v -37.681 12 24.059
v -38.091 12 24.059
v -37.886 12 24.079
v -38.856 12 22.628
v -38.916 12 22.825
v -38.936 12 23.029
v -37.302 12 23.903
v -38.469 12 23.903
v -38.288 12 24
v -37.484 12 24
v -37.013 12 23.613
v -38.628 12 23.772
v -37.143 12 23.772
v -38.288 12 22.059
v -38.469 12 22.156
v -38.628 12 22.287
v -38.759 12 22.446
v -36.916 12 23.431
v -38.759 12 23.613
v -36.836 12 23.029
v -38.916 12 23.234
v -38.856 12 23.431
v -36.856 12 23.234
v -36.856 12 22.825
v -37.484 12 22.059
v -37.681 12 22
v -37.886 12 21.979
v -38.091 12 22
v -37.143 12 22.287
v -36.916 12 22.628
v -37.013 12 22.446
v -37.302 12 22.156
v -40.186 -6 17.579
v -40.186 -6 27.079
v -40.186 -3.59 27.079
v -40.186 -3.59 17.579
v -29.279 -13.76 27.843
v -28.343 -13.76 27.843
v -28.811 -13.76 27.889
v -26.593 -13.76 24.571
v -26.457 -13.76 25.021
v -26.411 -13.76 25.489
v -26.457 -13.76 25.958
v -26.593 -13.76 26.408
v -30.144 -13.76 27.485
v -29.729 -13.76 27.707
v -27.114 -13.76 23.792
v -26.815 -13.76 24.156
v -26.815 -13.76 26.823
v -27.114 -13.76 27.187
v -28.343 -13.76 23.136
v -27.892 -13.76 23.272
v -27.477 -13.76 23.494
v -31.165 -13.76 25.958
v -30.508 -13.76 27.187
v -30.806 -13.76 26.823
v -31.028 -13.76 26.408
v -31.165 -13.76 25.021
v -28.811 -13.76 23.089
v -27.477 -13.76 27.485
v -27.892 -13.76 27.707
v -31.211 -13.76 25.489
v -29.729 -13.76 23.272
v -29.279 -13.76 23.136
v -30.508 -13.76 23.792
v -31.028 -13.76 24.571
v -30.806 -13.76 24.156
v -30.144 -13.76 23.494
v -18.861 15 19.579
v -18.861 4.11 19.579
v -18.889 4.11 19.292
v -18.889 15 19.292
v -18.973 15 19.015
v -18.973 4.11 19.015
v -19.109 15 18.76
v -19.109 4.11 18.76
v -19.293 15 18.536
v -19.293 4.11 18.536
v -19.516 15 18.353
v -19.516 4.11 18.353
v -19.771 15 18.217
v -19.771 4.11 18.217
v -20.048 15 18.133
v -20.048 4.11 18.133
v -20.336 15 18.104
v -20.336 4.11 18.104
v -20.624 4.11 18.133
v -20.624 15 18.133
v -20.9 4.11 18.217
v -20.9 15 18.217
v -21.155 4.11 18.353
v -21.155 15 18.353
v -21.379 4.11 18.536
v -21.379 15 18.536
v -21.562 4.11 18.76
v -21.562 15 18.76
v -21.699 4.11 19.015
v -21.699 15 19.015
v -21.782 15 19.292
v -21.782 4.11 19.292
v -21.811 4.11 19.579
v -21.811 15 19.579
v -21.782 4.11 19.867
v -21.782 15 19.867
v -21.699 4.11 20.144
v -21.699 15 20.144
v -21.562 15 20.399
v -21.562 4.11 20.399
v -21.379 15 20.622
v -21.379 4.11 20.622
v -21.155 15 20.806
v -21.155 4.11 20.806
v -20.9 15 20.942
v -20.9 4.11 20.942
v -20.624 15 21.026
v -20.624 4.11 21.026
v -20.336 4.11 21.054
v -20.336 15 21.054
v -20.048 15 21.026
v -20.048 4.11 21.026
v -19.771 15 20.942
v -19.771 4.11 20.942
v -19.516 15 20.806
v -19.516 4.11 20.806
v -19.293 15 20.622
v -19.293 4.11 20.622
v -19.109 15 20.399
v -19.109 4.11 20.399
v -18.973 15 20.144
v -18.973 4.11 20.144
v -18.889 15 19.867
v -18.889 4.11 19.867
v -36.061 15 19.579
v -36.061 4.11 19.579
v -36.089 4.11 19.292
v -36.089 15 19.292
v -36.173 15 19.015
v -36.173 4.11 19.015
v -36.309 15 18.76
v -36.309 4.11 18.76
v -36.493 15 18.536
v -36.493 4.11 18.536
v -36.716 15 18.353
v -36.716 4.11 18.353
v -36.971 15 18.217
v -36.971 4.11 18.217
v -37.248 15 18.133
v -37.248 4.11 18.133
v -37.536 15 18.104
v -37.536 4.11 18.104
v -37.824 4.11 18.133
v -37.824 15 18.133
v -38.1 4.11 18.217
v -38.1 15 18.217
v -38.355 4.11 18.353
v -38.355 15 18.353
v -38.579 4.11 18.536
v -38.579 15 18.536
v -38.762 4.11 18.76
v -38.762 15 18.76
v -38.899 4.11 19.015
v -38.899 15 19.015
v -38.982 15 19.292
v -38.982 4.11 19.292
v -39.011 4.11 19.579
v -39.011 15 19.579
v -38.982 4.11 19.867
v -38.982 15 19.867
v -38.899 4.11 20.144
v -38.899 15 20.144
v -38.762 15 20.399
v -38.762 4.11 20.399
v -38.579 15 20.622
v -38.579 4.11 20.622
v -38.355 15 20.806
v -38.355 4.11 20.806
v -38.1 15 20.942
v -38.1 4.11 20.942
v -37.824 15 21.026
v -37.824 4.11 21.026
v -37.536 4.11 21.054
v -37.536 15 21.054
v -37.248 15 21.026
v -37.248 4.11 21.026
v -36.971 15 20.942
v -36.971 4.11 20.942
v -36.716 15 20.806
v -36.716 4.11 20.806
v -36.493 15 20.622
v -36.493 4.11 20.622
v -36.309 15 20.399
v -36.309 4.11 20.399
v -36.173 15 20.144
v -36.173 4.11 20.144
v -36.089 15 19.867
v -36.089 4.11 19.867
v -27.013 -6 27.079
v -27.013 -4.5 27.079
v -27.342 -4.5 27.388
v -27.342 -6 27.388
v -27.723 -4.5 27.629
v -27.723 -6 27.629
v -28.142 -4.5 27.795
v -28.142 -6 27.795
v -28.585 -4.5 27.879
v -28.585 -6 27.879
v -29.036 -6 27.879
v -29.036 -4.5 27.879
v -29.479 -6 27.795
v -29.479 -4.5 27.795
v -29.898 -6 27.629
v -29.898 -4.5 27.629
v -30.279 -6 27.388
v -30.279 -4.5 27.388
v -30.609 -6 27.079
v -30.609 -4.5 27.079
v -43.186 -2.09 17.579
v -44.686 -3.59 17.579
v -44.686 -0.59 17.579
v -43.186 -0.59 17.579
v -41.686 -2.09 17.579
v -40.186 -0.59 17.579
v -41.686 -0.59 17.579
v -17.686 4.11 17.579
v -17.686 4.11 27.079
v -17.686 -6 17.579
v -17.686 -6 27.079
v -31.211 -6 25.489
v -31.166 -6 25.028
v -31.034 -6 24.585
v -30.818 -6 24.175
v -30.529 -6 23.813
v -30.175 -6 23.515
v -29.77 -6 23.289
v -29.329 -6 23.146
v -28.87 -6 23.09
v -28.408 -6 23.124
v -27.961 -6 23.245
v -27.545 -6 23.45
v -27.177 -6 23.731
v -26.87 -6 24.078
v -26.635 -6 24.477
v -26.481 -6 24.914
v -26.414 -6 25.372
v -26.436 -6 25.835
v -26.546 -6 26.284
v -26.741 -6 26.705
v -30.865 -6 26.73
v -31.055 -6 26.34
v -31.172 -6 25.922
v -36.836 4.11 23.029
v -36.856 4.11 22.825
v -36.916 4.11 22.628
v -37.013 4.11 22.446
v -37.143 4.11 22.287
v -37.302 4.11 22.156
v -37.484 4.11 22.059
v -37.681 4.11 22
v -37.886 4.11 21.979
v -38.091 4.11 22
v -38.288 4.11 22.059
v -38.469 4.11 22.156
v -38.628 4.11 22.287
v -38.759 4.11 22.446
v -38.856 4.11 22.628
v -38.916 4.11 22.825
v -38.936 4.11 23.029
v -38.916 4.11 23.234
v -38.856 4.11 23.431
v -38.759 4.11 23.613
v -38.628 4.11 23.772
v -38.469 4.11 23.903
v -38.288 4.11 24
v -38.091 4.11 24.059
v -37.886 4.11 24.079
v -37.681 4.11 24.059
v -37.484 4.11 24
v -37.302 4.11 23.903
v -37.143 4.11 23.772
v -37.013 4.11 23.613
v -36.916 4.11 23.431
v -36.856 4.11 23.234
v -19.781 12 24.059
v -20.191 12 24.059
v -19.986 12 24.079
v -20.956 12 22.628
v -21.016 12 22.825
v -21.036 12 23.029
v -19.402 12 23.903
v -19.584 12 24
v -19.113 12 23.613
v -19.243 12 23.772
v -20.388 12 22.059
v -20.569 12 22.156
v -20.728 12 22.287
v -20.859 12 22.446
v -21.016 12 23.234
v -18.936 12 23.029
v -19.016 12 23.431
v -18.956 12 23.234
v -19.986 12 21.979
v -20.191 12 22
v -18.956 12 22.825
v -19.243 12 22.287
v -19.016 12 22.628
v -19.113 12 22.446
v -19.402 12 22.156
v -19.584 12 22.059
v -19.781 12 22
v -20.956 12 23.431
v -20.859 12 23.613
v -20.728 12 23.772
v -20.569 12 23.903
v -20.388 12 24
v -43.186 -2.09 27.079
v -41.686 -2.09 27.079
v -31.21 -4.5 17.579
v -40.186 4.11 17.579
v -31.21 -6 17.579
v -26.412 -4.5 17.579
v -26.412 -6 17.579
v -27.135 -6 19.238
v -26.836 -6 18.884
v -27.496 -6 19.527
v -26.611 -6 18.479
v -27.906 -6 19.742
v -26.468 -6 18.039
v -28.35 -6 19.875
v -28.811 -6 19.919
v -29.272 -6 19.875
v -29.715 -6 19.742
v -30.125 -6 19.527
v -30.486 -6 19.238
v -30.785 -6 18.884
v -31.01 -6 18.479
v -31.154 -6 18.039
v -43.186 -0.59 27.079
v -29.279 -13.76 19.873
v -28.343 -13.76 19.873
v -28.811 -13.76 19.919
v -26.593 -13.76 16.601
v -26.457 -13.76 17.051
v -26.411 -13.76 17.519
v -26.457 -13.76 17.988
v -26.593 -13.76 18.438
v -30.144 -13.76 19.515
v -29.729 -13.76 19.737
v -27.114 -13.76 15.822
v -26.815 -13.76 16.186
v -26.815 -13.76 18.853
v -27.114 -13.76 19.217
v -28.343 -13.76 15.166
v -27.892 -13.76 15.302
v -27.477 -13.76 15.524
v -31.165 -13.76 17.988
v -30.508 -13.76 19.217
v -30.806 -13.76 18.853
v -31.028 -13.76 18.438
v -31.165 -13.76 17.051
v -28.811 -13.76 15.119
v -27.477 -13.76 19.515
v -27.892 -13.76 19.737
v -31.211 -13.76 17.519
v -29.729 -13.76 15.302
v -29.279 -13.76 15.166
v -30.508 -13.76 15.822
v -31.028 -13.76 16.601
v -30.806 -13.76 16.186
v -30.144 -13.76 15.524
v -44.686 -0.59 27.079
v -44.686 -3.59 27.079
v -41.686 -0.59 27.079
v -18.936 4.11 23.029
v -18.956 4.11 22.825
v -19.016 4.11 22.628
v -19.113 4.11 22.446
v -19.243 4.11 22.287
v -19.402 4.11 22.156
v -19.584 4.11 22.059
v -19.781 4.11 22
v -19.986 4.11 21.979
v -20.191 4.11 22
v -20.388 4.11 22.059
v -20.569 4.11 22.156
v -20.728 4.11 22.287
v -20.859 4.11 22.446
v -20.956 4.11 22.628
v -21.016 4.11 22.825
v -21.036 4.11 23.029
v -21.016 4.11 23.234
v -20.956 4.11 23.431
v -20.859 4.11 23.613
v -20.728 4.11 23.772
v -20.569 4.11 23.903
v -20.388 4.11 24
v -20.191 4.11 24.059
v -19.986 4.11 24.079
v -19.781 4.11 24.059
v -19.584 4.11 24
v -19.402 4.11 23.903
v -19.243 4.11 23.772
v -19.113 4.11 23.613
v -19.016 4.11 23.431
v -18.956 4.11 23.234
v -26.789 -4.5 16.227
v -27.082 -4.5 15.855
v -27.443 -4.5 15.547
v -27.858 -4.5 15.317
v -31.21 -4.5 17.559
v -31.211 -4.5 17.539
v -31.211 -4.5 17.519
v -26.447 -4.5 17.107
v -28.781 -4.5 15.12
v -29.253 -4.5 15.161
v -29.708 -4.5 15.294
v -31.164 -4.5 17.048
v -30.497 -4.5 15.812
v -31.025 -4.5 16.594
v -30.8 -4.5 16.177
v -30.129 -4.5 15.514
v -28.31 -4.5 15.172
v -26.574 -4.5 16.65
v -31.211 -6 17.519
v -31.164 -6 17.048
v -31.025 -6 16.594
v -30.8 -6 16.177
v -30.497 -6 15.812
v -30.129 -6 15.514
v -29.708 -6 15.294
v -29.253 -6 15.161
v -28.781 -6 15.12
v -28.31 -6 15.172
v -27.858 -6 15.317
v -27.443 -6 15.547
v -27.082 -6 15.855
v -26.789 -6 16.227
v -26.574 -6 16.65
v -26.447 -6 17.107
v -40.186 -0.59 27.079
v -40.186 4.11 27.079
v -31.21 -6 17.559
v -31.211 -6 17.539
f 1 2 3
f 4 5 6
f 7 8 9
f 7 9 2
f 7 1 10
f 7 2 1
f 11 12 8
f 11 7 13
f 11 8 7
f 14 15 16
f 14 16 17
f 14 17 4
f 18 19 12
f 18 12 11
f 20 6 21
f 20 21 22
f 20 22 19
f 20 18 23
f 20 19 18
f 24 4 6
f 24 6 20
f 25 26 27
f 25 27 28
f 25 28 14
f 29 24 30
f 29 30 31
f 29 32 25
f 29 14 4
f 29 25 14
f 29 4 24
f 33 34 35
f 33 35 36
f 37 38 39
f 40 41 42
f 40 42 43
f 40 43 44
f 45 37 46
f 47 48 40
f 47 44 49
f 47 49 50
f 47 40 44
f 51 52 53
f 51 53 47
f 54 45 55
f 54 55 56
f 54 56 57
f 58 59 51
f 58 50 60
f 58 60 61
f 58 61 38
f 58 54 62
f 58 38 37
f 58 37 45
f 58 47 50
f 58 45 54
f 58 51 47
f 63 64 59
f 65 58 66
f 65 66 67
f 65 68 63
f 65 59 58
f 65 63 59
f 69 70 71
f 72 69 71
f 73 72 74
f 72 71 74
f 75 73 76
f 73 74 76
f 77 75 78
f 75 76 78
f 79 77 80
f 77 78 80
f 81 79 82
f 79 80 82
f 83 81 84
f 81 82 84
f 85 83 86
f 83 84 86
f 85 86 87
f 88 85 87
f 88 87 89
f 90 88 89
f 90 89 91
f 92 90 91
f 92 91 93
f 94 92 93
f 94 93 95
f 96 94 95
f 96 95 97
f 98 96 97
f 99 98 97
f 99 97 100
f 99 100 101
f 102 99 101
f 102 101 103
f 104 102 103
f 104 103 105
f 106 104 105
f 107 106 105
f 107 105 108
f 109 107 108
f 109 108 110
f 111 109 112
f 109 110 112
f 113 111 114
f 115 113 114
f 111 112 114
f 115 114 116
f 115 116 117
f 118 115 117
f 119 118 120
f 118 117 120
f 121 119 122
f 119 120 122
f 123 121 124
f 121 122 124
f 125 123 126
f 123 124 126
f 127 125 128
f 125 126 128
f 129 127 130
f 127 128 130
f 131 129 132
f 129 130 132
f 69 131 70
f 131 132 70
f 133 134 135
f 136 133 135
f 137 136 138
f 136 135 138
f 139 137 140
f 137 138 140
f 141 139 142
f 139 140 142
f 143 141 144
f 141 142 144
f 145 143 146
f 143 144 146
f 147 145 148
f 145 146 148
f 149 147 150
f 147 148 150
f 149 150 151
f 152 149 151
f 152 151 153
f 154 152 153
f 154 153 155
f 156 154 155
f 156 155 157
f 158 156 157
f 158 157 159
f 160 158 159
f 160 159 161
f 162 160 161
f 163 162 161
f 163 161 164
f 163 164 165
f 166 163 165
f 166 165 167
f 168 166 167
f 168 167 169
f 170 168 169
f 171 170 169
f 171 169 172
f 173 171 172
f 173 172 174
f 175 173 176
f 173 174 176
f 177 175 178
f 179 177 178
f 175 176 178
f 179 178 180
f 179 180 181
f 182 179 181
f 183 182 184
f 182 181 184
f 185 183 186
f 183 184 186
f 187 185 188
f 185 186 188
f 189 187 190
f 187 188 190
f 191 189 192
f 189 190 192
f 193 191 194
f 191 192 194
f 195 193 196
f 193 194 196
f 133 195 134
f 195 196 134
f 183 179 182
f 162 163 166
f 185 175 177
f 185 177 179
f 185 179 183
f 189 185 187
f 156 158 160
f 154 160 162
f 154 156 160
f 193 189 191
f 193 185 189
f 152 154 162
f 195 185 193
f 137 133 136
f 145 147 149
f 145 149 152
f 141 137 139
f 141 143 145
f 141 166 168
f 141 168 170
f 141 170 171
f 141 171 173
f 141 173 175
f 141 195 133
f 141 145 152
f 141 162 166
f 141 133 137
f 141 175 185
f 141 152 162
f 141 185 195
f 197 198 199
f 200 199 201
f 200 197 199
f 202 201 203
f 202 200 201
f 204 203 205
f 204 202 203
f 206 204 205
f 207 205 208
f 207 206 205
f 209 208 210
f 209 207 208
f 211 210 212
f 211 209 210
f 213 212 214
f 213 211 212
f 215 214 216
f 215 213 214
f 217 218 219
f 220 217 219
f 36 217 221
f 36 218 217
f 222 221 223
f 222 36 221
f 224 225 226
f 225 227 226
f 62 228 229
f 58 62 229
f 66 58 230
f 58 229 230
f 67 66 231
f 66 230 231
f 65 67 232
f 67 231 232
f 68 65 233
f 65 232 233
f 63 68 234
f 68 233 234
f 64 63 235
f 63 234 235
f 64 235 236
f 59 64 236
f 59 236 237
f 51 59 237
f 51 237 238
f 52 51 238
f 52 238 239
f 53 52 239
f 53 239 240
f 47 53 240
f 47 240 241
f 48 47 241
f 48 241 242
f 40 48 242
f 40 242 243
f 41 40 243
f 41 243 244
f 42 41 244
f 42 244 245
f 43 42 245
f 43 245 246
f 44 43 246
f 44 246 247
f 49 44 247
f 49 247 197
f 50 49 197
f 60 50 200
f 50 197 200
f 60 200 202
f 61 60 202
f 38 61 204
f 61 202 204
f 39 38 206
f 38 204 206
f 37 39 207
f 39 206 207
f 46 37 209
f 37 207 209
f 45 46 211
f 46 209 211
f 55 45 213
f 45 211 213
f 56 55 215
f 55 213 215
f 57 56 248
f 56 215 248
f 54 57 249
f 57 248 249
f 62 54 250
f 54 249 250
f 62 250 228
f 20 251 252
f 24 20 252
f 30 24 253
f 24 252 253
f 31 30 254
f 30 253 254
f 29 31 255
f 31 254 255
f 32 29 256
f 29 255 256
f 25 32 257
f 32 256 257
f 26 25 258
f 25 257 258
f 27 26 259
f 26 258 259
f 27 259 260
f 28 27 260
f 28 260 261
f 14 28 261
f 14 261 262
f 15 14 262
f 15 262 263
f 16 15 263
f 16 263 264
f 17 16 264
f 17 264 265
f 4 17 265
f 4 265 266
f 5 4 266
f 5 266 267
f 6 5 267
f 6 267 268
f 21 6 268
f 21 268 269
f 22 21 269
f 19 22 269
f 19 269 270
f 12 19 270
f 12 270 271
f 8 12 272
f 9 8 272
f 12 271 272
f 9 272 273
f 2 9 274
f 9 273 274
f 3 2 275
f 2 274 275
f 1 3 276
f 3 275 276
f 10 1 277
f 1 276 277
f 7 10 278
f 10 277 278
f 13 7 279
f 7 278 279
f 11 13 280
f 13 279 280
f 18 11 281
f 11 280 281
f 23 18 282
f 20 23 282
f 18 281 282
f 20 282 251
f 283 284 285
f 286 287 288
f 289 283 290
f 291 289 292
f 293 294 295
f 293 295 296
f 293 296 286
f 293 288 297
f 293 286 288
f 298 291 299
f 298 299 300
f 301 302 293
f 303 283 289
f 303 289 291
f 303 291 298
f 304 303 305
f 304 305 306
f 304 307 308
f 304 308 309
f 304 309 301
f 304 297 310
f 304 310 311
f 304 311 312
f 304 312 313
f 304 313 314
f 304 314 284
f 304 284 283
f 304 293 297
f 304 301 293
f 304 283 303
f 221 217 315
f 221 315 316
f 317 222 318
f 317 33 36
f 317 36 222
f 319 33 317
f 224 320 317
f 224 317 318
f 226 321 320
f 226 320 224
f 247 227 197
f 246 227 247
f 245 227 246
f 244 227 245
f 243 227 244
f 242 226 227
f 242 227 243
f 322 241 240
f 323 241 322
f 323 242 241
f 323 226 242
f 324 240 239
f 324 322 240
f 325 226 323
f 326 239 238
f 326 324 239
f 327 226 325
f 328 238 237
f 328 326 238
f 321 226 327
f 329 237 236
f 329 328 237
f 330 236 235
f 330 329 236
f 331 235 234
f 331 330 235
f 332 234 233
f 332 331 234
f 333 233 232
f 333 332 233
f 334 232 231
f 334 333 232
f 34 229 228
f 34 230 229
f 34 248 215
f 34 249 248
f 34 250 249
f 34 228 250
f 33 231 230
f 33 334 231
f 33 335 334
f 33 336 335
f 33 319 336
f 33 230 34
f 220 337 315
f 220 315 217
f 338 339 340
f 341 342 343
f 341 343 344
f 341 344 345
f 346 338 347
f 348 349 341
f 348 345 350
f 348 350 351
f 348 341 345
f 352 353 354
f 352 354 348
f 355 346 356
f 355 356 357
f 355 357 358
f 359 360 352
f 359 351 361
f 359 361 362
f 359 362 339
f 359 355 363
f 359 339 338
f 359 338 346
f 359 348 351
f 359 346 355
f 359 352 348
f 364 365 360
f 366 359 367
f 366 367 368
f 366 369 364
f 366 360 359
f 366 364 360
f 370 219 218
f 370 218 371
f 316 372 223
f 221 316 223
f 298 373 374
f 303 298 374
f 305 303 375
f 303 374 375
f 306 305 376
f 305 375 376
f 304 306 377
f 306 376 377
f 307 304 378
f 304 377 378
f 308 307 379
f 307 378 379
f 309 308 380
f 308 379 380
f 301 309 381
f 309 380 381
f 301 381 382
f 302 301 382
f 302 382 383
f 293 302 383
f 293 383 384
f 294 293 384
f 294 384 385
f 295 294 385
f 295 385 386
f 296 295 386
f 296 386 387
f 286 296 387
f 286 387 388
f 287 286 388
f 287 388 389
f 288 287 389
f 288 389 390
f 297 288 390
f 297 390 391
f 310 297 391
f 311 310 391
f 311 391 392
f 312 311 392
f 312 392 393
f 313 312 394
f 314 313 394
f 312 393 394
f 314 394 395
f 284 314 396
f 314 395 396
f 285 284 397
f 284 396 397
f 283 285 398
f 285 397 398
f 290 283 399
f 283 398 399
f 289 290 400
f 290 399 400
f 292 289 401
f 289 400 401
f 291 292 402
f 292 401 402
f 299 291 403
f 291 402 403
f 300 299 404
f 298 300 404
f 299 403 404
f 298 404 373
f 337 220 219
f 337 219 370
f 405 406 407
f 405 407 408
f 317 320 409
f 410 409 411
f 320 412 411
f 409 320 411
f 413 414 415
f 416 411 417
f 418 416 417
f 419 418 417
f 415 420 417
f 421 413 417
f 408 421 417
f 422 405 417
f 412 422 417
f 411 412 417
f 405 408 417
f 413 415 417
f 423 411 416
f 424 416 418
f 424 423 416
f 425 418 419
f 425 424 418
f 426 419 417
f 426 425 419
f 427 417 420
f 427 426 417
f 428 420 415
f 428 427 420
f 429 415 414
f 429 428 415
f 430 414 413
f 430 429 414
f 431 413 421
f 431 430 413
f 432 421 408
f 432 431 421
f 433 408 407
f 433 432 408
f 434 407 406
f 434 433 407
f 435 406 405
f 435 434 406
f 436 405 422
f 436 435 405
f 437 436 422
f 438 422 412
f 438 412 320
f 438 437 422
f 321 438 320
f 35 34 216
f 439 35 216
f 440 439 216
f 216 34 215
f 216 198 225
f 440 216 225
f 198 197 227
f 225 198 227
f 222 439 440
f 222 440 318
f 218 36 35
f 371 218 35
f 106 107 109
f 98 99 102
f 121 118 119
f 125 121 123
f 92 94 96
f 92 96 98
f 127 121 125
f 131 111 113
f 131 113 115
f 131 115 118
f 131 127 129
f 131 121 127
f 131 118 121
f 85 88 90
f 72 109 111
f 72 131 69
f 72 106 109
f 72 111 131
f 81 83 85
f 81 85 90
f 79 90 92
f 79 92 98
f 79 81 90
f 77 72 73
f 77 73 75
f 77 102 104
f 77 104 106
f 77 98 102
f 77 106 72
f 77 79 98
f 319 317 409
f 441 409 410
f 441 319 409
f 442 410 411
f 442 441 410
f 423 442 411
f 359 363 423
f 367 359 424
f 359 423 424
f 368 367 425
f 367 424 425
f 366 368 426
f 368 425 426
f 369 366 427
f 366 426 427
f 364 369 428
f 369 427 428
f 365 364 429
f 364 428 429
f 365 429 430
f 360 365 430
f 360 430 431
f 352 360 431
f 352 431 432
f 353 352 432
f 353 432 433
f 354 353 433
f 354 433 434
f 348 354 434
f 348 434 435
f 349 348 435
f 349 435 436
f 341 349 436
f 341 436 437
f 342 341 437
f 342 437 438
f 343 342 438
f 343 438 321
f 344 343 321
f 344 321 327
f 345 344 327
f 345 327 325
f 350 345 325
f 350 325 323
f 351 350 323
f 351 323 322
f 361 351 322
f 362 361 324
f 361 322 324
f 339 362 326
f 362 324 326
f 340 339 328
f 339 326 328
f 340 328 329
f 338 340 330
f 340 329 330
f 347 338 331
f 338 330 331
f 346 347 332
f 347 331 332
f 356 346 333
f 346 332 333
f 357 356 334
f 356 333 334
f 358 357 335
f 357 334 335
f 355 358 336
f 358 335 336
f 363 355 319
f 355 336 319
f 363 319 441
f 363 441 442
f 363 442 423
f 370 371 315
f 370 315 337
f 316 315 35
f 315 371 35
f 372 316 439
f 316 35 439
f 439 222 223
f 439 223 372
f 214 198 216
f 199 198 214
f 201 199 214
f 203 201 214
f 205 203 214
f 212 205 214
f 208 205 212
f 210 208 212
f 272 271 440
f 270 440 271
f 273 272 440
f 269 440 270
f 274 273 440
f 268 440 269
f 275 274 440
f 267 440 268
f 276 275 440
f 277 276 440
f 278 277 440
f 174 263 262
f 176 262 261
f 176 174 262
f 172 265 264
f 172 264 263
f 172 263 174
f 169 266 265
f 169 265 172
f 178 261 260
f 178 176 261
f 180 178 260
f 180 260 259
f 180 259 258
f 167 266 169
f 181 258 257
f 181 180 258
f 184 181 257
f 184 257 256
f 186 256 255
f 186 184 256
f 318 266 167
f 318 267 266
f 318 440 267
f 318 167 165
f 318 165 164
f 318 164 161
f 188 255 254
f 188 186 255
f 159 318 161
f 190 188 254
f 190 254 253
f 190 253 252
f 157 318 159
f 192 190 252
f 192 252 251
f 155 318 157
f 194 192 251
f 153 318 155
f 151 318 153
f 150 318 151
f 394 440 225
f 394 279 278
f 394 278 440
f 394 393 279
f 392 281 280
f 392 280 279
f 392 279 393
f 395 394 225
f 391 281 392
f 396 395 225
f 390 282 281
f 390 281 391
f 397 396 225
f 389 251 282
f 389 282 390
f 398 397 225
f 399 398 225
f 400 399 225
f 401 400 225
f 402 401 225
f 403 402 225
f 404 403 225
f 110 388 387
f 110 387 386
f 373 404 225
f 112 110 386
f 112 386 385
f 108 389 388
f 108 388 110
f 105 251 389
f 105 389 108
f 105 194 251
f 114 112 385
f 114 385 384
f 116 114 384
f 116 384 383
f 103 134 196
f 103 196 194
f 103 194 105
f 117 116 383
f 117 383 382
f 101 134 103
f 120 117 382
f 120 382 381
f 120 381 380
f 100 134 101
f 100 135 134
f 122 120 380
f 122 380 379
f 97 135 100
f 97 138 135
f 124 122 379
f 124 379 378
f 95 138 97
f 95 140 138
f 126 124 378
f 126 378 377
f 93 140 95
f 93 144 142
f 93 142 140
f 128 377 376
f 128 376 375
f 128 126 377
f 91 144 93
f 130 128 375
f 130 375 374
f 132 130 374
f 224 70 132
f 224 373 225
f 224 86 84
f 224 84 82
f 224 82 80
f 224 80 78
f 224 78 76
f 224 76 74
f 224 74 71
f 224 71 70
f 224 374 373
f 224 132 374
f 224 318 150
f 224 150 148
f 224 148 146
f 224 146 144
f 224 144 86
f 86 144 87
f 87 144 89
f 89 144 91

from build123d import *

# Parameters (mm, degrees)
SKETCH1_W                = 22.5
SKETCH1_H                = 7
BOSS_EXTRUDE1_DEPTH      = 1.5
SKETCH2_R                = 1.475
BOSS_EXTRUDE2_DEPTH      = 13.5
SKETCH3_R                = 1.05
BOSS_EXTRUDE3_DEPTH      = 10.5
SKETCH4_W                = 22.5
SKETCH4_H                = 2.5
SKETCH4_H_2              = 7
BOSS_EXTRUDE4_DEPTH      = 6
BOSS_EXTRUDE4_DEPTH_BACK = 1.5
SKETCH8_W                = 22.5
SKETCH8_H                = 9.5
BOSS_EXTRUDE7_DEPTH      = 2.61
SKETCH9_R                = 2.4
BOSS_EXTRUDE8_DEPTH      = 7.76
BOSS_EXTRUDE8_DEPTH_BACK = 1.5
SKETCH15_W               = 9.5
SKETCH15_H               = 3
BOSS_EXTRUDE11_DEPTH     = 4.5
SKETCH16_W               = 1.5
SKETCH16_H               = 9.5
CUT_EXTRUDE3_DEPTH       = 1.5


with BuildPart() as part:
    # Sketch1 → Boss-Extrude1 (new body)
    with BuildSketch(Plane(origin=(0, 0, 0), x_dir=(1, 0, 0), z_dir=(0, 1, 0))):
        with Locations((-28.93578967, -21.079480712)):
            Rectangle(SKETCH1_W, SKETCH1_H)
    extrude(amount=BOSS_EXTRUDE1_DEPTH)

    # Sketch2 → Boss-Extrude2 (add)
    with BuildSketch(Plane(origin=(0, 1.5, 0), x_dir=(1, 0, 0), z_dir=(0, 1, 0))):
        with Locations((-37.53578967, -19.579480712)):
            Circle(SKETCH2_R)
        with Locations((-20.33578967, -19.579480712)):
            Circle(SKETCH2_R)
    extrude(amount=BOSS_EXTRUDE2_DEPTH)

    # Sketch3 → Boss-Extrude3 (add)
    with BuildSketch(Plane(origin=(0, 1.5, 0), x_dir=(1, 0, 0), z_dir=(0, 1, 0))):
        with Locations((-37.88578967, -23.029480712)):
            Circle(SKETCH3_R)
        with Locations((-19.98578967, -23.029480712)):
            Circle(SKETCH3_R)
    extrude(amount=BOSS_EXTRUDE3_DEPTH)

    # Sketch4 → Boss-Extrude4 (add, two sides)
    with BuildSketch(Plane(origin=(0, 0, 0), x_dir=(-1, 0, 0), z_dir=(0, -1, 0))) as boss_extrude4_sk:
        with Locations((28.93578967, -25.829480712)):
            Rectangle(SKETCH4_W, SKETCH4_H)
        with Locations((28.93578967, -21.079480712)):
            Rectangle(SKETCH4_W, SKETCH4_H_2)
    extrude(amount=BOSS_EXTRUDE4_DEPTH)
    extrude(boss_extrude4_sk.sketch, amount=-BOSS_EXTRUDE4_DEPTH_BACK)

    # Sketch8 → Boss-Extrude7 (add)
    with BuildSketch(Plane(origin=(0, 1.5, 0), x_dir=(1, 0, 0), z_dir=(0, 1, 0))):
        with Locations((-28.93578967, -22.329480712)):
            Rectangle(SKETCH8_W, SKETCH8_H)
    extrude(amount=BOSS_EXTRUDE7_DEPTH)

    # Sketch9 → Boss-Extrude8 (add, two sides)
    with BuildSketch(Plane(origin=(0, -6, 0), x_dir=(-1, 0, 0), z_dir=(0, -1, 0))) as boss_extrude8_sk:
        with Locations((28.81078967, -25.489480712)):
            Circle(SKETCH9_R)
        with Locations((28.81078967, -17.519480712)):
            Circle(SKETCH9_R)
    extrude(amount=BOSS_EXTRUDE8_DEPTH)
    extrude(boss_extrude8_sk.sketch, amount=-BOSS_EXTRUDE8_DEPTH_BACK)

    # Sketch15 → Boss-Extrude11 (add)
    with BuildSketch(Plane.ZY.offset(40.18578967)):
        with Locations((22.329480712, -2.09)):
            Rectangle(SKETCH15_W, SKETCH15_H)
    extrude(amount=BOSS_EXTRUDE11_DEPTH)

    # Sketch16 → Cut-Extrude3 (cut)
    with BuildSketch(Plane(origin=(0, -0.59, 0), x_dir=(1, 0, 0), z_dir=(0, 1, 0))):
        with Locations((-42.43578967, -22.329480712)):
            Rectangle(SKETCH16_W, SKETCH16_H)
    extrude(amount=-CUT_EXTRUDE3_DEPTH, mode=Mode.SUBTRACT)


solid = part.part
